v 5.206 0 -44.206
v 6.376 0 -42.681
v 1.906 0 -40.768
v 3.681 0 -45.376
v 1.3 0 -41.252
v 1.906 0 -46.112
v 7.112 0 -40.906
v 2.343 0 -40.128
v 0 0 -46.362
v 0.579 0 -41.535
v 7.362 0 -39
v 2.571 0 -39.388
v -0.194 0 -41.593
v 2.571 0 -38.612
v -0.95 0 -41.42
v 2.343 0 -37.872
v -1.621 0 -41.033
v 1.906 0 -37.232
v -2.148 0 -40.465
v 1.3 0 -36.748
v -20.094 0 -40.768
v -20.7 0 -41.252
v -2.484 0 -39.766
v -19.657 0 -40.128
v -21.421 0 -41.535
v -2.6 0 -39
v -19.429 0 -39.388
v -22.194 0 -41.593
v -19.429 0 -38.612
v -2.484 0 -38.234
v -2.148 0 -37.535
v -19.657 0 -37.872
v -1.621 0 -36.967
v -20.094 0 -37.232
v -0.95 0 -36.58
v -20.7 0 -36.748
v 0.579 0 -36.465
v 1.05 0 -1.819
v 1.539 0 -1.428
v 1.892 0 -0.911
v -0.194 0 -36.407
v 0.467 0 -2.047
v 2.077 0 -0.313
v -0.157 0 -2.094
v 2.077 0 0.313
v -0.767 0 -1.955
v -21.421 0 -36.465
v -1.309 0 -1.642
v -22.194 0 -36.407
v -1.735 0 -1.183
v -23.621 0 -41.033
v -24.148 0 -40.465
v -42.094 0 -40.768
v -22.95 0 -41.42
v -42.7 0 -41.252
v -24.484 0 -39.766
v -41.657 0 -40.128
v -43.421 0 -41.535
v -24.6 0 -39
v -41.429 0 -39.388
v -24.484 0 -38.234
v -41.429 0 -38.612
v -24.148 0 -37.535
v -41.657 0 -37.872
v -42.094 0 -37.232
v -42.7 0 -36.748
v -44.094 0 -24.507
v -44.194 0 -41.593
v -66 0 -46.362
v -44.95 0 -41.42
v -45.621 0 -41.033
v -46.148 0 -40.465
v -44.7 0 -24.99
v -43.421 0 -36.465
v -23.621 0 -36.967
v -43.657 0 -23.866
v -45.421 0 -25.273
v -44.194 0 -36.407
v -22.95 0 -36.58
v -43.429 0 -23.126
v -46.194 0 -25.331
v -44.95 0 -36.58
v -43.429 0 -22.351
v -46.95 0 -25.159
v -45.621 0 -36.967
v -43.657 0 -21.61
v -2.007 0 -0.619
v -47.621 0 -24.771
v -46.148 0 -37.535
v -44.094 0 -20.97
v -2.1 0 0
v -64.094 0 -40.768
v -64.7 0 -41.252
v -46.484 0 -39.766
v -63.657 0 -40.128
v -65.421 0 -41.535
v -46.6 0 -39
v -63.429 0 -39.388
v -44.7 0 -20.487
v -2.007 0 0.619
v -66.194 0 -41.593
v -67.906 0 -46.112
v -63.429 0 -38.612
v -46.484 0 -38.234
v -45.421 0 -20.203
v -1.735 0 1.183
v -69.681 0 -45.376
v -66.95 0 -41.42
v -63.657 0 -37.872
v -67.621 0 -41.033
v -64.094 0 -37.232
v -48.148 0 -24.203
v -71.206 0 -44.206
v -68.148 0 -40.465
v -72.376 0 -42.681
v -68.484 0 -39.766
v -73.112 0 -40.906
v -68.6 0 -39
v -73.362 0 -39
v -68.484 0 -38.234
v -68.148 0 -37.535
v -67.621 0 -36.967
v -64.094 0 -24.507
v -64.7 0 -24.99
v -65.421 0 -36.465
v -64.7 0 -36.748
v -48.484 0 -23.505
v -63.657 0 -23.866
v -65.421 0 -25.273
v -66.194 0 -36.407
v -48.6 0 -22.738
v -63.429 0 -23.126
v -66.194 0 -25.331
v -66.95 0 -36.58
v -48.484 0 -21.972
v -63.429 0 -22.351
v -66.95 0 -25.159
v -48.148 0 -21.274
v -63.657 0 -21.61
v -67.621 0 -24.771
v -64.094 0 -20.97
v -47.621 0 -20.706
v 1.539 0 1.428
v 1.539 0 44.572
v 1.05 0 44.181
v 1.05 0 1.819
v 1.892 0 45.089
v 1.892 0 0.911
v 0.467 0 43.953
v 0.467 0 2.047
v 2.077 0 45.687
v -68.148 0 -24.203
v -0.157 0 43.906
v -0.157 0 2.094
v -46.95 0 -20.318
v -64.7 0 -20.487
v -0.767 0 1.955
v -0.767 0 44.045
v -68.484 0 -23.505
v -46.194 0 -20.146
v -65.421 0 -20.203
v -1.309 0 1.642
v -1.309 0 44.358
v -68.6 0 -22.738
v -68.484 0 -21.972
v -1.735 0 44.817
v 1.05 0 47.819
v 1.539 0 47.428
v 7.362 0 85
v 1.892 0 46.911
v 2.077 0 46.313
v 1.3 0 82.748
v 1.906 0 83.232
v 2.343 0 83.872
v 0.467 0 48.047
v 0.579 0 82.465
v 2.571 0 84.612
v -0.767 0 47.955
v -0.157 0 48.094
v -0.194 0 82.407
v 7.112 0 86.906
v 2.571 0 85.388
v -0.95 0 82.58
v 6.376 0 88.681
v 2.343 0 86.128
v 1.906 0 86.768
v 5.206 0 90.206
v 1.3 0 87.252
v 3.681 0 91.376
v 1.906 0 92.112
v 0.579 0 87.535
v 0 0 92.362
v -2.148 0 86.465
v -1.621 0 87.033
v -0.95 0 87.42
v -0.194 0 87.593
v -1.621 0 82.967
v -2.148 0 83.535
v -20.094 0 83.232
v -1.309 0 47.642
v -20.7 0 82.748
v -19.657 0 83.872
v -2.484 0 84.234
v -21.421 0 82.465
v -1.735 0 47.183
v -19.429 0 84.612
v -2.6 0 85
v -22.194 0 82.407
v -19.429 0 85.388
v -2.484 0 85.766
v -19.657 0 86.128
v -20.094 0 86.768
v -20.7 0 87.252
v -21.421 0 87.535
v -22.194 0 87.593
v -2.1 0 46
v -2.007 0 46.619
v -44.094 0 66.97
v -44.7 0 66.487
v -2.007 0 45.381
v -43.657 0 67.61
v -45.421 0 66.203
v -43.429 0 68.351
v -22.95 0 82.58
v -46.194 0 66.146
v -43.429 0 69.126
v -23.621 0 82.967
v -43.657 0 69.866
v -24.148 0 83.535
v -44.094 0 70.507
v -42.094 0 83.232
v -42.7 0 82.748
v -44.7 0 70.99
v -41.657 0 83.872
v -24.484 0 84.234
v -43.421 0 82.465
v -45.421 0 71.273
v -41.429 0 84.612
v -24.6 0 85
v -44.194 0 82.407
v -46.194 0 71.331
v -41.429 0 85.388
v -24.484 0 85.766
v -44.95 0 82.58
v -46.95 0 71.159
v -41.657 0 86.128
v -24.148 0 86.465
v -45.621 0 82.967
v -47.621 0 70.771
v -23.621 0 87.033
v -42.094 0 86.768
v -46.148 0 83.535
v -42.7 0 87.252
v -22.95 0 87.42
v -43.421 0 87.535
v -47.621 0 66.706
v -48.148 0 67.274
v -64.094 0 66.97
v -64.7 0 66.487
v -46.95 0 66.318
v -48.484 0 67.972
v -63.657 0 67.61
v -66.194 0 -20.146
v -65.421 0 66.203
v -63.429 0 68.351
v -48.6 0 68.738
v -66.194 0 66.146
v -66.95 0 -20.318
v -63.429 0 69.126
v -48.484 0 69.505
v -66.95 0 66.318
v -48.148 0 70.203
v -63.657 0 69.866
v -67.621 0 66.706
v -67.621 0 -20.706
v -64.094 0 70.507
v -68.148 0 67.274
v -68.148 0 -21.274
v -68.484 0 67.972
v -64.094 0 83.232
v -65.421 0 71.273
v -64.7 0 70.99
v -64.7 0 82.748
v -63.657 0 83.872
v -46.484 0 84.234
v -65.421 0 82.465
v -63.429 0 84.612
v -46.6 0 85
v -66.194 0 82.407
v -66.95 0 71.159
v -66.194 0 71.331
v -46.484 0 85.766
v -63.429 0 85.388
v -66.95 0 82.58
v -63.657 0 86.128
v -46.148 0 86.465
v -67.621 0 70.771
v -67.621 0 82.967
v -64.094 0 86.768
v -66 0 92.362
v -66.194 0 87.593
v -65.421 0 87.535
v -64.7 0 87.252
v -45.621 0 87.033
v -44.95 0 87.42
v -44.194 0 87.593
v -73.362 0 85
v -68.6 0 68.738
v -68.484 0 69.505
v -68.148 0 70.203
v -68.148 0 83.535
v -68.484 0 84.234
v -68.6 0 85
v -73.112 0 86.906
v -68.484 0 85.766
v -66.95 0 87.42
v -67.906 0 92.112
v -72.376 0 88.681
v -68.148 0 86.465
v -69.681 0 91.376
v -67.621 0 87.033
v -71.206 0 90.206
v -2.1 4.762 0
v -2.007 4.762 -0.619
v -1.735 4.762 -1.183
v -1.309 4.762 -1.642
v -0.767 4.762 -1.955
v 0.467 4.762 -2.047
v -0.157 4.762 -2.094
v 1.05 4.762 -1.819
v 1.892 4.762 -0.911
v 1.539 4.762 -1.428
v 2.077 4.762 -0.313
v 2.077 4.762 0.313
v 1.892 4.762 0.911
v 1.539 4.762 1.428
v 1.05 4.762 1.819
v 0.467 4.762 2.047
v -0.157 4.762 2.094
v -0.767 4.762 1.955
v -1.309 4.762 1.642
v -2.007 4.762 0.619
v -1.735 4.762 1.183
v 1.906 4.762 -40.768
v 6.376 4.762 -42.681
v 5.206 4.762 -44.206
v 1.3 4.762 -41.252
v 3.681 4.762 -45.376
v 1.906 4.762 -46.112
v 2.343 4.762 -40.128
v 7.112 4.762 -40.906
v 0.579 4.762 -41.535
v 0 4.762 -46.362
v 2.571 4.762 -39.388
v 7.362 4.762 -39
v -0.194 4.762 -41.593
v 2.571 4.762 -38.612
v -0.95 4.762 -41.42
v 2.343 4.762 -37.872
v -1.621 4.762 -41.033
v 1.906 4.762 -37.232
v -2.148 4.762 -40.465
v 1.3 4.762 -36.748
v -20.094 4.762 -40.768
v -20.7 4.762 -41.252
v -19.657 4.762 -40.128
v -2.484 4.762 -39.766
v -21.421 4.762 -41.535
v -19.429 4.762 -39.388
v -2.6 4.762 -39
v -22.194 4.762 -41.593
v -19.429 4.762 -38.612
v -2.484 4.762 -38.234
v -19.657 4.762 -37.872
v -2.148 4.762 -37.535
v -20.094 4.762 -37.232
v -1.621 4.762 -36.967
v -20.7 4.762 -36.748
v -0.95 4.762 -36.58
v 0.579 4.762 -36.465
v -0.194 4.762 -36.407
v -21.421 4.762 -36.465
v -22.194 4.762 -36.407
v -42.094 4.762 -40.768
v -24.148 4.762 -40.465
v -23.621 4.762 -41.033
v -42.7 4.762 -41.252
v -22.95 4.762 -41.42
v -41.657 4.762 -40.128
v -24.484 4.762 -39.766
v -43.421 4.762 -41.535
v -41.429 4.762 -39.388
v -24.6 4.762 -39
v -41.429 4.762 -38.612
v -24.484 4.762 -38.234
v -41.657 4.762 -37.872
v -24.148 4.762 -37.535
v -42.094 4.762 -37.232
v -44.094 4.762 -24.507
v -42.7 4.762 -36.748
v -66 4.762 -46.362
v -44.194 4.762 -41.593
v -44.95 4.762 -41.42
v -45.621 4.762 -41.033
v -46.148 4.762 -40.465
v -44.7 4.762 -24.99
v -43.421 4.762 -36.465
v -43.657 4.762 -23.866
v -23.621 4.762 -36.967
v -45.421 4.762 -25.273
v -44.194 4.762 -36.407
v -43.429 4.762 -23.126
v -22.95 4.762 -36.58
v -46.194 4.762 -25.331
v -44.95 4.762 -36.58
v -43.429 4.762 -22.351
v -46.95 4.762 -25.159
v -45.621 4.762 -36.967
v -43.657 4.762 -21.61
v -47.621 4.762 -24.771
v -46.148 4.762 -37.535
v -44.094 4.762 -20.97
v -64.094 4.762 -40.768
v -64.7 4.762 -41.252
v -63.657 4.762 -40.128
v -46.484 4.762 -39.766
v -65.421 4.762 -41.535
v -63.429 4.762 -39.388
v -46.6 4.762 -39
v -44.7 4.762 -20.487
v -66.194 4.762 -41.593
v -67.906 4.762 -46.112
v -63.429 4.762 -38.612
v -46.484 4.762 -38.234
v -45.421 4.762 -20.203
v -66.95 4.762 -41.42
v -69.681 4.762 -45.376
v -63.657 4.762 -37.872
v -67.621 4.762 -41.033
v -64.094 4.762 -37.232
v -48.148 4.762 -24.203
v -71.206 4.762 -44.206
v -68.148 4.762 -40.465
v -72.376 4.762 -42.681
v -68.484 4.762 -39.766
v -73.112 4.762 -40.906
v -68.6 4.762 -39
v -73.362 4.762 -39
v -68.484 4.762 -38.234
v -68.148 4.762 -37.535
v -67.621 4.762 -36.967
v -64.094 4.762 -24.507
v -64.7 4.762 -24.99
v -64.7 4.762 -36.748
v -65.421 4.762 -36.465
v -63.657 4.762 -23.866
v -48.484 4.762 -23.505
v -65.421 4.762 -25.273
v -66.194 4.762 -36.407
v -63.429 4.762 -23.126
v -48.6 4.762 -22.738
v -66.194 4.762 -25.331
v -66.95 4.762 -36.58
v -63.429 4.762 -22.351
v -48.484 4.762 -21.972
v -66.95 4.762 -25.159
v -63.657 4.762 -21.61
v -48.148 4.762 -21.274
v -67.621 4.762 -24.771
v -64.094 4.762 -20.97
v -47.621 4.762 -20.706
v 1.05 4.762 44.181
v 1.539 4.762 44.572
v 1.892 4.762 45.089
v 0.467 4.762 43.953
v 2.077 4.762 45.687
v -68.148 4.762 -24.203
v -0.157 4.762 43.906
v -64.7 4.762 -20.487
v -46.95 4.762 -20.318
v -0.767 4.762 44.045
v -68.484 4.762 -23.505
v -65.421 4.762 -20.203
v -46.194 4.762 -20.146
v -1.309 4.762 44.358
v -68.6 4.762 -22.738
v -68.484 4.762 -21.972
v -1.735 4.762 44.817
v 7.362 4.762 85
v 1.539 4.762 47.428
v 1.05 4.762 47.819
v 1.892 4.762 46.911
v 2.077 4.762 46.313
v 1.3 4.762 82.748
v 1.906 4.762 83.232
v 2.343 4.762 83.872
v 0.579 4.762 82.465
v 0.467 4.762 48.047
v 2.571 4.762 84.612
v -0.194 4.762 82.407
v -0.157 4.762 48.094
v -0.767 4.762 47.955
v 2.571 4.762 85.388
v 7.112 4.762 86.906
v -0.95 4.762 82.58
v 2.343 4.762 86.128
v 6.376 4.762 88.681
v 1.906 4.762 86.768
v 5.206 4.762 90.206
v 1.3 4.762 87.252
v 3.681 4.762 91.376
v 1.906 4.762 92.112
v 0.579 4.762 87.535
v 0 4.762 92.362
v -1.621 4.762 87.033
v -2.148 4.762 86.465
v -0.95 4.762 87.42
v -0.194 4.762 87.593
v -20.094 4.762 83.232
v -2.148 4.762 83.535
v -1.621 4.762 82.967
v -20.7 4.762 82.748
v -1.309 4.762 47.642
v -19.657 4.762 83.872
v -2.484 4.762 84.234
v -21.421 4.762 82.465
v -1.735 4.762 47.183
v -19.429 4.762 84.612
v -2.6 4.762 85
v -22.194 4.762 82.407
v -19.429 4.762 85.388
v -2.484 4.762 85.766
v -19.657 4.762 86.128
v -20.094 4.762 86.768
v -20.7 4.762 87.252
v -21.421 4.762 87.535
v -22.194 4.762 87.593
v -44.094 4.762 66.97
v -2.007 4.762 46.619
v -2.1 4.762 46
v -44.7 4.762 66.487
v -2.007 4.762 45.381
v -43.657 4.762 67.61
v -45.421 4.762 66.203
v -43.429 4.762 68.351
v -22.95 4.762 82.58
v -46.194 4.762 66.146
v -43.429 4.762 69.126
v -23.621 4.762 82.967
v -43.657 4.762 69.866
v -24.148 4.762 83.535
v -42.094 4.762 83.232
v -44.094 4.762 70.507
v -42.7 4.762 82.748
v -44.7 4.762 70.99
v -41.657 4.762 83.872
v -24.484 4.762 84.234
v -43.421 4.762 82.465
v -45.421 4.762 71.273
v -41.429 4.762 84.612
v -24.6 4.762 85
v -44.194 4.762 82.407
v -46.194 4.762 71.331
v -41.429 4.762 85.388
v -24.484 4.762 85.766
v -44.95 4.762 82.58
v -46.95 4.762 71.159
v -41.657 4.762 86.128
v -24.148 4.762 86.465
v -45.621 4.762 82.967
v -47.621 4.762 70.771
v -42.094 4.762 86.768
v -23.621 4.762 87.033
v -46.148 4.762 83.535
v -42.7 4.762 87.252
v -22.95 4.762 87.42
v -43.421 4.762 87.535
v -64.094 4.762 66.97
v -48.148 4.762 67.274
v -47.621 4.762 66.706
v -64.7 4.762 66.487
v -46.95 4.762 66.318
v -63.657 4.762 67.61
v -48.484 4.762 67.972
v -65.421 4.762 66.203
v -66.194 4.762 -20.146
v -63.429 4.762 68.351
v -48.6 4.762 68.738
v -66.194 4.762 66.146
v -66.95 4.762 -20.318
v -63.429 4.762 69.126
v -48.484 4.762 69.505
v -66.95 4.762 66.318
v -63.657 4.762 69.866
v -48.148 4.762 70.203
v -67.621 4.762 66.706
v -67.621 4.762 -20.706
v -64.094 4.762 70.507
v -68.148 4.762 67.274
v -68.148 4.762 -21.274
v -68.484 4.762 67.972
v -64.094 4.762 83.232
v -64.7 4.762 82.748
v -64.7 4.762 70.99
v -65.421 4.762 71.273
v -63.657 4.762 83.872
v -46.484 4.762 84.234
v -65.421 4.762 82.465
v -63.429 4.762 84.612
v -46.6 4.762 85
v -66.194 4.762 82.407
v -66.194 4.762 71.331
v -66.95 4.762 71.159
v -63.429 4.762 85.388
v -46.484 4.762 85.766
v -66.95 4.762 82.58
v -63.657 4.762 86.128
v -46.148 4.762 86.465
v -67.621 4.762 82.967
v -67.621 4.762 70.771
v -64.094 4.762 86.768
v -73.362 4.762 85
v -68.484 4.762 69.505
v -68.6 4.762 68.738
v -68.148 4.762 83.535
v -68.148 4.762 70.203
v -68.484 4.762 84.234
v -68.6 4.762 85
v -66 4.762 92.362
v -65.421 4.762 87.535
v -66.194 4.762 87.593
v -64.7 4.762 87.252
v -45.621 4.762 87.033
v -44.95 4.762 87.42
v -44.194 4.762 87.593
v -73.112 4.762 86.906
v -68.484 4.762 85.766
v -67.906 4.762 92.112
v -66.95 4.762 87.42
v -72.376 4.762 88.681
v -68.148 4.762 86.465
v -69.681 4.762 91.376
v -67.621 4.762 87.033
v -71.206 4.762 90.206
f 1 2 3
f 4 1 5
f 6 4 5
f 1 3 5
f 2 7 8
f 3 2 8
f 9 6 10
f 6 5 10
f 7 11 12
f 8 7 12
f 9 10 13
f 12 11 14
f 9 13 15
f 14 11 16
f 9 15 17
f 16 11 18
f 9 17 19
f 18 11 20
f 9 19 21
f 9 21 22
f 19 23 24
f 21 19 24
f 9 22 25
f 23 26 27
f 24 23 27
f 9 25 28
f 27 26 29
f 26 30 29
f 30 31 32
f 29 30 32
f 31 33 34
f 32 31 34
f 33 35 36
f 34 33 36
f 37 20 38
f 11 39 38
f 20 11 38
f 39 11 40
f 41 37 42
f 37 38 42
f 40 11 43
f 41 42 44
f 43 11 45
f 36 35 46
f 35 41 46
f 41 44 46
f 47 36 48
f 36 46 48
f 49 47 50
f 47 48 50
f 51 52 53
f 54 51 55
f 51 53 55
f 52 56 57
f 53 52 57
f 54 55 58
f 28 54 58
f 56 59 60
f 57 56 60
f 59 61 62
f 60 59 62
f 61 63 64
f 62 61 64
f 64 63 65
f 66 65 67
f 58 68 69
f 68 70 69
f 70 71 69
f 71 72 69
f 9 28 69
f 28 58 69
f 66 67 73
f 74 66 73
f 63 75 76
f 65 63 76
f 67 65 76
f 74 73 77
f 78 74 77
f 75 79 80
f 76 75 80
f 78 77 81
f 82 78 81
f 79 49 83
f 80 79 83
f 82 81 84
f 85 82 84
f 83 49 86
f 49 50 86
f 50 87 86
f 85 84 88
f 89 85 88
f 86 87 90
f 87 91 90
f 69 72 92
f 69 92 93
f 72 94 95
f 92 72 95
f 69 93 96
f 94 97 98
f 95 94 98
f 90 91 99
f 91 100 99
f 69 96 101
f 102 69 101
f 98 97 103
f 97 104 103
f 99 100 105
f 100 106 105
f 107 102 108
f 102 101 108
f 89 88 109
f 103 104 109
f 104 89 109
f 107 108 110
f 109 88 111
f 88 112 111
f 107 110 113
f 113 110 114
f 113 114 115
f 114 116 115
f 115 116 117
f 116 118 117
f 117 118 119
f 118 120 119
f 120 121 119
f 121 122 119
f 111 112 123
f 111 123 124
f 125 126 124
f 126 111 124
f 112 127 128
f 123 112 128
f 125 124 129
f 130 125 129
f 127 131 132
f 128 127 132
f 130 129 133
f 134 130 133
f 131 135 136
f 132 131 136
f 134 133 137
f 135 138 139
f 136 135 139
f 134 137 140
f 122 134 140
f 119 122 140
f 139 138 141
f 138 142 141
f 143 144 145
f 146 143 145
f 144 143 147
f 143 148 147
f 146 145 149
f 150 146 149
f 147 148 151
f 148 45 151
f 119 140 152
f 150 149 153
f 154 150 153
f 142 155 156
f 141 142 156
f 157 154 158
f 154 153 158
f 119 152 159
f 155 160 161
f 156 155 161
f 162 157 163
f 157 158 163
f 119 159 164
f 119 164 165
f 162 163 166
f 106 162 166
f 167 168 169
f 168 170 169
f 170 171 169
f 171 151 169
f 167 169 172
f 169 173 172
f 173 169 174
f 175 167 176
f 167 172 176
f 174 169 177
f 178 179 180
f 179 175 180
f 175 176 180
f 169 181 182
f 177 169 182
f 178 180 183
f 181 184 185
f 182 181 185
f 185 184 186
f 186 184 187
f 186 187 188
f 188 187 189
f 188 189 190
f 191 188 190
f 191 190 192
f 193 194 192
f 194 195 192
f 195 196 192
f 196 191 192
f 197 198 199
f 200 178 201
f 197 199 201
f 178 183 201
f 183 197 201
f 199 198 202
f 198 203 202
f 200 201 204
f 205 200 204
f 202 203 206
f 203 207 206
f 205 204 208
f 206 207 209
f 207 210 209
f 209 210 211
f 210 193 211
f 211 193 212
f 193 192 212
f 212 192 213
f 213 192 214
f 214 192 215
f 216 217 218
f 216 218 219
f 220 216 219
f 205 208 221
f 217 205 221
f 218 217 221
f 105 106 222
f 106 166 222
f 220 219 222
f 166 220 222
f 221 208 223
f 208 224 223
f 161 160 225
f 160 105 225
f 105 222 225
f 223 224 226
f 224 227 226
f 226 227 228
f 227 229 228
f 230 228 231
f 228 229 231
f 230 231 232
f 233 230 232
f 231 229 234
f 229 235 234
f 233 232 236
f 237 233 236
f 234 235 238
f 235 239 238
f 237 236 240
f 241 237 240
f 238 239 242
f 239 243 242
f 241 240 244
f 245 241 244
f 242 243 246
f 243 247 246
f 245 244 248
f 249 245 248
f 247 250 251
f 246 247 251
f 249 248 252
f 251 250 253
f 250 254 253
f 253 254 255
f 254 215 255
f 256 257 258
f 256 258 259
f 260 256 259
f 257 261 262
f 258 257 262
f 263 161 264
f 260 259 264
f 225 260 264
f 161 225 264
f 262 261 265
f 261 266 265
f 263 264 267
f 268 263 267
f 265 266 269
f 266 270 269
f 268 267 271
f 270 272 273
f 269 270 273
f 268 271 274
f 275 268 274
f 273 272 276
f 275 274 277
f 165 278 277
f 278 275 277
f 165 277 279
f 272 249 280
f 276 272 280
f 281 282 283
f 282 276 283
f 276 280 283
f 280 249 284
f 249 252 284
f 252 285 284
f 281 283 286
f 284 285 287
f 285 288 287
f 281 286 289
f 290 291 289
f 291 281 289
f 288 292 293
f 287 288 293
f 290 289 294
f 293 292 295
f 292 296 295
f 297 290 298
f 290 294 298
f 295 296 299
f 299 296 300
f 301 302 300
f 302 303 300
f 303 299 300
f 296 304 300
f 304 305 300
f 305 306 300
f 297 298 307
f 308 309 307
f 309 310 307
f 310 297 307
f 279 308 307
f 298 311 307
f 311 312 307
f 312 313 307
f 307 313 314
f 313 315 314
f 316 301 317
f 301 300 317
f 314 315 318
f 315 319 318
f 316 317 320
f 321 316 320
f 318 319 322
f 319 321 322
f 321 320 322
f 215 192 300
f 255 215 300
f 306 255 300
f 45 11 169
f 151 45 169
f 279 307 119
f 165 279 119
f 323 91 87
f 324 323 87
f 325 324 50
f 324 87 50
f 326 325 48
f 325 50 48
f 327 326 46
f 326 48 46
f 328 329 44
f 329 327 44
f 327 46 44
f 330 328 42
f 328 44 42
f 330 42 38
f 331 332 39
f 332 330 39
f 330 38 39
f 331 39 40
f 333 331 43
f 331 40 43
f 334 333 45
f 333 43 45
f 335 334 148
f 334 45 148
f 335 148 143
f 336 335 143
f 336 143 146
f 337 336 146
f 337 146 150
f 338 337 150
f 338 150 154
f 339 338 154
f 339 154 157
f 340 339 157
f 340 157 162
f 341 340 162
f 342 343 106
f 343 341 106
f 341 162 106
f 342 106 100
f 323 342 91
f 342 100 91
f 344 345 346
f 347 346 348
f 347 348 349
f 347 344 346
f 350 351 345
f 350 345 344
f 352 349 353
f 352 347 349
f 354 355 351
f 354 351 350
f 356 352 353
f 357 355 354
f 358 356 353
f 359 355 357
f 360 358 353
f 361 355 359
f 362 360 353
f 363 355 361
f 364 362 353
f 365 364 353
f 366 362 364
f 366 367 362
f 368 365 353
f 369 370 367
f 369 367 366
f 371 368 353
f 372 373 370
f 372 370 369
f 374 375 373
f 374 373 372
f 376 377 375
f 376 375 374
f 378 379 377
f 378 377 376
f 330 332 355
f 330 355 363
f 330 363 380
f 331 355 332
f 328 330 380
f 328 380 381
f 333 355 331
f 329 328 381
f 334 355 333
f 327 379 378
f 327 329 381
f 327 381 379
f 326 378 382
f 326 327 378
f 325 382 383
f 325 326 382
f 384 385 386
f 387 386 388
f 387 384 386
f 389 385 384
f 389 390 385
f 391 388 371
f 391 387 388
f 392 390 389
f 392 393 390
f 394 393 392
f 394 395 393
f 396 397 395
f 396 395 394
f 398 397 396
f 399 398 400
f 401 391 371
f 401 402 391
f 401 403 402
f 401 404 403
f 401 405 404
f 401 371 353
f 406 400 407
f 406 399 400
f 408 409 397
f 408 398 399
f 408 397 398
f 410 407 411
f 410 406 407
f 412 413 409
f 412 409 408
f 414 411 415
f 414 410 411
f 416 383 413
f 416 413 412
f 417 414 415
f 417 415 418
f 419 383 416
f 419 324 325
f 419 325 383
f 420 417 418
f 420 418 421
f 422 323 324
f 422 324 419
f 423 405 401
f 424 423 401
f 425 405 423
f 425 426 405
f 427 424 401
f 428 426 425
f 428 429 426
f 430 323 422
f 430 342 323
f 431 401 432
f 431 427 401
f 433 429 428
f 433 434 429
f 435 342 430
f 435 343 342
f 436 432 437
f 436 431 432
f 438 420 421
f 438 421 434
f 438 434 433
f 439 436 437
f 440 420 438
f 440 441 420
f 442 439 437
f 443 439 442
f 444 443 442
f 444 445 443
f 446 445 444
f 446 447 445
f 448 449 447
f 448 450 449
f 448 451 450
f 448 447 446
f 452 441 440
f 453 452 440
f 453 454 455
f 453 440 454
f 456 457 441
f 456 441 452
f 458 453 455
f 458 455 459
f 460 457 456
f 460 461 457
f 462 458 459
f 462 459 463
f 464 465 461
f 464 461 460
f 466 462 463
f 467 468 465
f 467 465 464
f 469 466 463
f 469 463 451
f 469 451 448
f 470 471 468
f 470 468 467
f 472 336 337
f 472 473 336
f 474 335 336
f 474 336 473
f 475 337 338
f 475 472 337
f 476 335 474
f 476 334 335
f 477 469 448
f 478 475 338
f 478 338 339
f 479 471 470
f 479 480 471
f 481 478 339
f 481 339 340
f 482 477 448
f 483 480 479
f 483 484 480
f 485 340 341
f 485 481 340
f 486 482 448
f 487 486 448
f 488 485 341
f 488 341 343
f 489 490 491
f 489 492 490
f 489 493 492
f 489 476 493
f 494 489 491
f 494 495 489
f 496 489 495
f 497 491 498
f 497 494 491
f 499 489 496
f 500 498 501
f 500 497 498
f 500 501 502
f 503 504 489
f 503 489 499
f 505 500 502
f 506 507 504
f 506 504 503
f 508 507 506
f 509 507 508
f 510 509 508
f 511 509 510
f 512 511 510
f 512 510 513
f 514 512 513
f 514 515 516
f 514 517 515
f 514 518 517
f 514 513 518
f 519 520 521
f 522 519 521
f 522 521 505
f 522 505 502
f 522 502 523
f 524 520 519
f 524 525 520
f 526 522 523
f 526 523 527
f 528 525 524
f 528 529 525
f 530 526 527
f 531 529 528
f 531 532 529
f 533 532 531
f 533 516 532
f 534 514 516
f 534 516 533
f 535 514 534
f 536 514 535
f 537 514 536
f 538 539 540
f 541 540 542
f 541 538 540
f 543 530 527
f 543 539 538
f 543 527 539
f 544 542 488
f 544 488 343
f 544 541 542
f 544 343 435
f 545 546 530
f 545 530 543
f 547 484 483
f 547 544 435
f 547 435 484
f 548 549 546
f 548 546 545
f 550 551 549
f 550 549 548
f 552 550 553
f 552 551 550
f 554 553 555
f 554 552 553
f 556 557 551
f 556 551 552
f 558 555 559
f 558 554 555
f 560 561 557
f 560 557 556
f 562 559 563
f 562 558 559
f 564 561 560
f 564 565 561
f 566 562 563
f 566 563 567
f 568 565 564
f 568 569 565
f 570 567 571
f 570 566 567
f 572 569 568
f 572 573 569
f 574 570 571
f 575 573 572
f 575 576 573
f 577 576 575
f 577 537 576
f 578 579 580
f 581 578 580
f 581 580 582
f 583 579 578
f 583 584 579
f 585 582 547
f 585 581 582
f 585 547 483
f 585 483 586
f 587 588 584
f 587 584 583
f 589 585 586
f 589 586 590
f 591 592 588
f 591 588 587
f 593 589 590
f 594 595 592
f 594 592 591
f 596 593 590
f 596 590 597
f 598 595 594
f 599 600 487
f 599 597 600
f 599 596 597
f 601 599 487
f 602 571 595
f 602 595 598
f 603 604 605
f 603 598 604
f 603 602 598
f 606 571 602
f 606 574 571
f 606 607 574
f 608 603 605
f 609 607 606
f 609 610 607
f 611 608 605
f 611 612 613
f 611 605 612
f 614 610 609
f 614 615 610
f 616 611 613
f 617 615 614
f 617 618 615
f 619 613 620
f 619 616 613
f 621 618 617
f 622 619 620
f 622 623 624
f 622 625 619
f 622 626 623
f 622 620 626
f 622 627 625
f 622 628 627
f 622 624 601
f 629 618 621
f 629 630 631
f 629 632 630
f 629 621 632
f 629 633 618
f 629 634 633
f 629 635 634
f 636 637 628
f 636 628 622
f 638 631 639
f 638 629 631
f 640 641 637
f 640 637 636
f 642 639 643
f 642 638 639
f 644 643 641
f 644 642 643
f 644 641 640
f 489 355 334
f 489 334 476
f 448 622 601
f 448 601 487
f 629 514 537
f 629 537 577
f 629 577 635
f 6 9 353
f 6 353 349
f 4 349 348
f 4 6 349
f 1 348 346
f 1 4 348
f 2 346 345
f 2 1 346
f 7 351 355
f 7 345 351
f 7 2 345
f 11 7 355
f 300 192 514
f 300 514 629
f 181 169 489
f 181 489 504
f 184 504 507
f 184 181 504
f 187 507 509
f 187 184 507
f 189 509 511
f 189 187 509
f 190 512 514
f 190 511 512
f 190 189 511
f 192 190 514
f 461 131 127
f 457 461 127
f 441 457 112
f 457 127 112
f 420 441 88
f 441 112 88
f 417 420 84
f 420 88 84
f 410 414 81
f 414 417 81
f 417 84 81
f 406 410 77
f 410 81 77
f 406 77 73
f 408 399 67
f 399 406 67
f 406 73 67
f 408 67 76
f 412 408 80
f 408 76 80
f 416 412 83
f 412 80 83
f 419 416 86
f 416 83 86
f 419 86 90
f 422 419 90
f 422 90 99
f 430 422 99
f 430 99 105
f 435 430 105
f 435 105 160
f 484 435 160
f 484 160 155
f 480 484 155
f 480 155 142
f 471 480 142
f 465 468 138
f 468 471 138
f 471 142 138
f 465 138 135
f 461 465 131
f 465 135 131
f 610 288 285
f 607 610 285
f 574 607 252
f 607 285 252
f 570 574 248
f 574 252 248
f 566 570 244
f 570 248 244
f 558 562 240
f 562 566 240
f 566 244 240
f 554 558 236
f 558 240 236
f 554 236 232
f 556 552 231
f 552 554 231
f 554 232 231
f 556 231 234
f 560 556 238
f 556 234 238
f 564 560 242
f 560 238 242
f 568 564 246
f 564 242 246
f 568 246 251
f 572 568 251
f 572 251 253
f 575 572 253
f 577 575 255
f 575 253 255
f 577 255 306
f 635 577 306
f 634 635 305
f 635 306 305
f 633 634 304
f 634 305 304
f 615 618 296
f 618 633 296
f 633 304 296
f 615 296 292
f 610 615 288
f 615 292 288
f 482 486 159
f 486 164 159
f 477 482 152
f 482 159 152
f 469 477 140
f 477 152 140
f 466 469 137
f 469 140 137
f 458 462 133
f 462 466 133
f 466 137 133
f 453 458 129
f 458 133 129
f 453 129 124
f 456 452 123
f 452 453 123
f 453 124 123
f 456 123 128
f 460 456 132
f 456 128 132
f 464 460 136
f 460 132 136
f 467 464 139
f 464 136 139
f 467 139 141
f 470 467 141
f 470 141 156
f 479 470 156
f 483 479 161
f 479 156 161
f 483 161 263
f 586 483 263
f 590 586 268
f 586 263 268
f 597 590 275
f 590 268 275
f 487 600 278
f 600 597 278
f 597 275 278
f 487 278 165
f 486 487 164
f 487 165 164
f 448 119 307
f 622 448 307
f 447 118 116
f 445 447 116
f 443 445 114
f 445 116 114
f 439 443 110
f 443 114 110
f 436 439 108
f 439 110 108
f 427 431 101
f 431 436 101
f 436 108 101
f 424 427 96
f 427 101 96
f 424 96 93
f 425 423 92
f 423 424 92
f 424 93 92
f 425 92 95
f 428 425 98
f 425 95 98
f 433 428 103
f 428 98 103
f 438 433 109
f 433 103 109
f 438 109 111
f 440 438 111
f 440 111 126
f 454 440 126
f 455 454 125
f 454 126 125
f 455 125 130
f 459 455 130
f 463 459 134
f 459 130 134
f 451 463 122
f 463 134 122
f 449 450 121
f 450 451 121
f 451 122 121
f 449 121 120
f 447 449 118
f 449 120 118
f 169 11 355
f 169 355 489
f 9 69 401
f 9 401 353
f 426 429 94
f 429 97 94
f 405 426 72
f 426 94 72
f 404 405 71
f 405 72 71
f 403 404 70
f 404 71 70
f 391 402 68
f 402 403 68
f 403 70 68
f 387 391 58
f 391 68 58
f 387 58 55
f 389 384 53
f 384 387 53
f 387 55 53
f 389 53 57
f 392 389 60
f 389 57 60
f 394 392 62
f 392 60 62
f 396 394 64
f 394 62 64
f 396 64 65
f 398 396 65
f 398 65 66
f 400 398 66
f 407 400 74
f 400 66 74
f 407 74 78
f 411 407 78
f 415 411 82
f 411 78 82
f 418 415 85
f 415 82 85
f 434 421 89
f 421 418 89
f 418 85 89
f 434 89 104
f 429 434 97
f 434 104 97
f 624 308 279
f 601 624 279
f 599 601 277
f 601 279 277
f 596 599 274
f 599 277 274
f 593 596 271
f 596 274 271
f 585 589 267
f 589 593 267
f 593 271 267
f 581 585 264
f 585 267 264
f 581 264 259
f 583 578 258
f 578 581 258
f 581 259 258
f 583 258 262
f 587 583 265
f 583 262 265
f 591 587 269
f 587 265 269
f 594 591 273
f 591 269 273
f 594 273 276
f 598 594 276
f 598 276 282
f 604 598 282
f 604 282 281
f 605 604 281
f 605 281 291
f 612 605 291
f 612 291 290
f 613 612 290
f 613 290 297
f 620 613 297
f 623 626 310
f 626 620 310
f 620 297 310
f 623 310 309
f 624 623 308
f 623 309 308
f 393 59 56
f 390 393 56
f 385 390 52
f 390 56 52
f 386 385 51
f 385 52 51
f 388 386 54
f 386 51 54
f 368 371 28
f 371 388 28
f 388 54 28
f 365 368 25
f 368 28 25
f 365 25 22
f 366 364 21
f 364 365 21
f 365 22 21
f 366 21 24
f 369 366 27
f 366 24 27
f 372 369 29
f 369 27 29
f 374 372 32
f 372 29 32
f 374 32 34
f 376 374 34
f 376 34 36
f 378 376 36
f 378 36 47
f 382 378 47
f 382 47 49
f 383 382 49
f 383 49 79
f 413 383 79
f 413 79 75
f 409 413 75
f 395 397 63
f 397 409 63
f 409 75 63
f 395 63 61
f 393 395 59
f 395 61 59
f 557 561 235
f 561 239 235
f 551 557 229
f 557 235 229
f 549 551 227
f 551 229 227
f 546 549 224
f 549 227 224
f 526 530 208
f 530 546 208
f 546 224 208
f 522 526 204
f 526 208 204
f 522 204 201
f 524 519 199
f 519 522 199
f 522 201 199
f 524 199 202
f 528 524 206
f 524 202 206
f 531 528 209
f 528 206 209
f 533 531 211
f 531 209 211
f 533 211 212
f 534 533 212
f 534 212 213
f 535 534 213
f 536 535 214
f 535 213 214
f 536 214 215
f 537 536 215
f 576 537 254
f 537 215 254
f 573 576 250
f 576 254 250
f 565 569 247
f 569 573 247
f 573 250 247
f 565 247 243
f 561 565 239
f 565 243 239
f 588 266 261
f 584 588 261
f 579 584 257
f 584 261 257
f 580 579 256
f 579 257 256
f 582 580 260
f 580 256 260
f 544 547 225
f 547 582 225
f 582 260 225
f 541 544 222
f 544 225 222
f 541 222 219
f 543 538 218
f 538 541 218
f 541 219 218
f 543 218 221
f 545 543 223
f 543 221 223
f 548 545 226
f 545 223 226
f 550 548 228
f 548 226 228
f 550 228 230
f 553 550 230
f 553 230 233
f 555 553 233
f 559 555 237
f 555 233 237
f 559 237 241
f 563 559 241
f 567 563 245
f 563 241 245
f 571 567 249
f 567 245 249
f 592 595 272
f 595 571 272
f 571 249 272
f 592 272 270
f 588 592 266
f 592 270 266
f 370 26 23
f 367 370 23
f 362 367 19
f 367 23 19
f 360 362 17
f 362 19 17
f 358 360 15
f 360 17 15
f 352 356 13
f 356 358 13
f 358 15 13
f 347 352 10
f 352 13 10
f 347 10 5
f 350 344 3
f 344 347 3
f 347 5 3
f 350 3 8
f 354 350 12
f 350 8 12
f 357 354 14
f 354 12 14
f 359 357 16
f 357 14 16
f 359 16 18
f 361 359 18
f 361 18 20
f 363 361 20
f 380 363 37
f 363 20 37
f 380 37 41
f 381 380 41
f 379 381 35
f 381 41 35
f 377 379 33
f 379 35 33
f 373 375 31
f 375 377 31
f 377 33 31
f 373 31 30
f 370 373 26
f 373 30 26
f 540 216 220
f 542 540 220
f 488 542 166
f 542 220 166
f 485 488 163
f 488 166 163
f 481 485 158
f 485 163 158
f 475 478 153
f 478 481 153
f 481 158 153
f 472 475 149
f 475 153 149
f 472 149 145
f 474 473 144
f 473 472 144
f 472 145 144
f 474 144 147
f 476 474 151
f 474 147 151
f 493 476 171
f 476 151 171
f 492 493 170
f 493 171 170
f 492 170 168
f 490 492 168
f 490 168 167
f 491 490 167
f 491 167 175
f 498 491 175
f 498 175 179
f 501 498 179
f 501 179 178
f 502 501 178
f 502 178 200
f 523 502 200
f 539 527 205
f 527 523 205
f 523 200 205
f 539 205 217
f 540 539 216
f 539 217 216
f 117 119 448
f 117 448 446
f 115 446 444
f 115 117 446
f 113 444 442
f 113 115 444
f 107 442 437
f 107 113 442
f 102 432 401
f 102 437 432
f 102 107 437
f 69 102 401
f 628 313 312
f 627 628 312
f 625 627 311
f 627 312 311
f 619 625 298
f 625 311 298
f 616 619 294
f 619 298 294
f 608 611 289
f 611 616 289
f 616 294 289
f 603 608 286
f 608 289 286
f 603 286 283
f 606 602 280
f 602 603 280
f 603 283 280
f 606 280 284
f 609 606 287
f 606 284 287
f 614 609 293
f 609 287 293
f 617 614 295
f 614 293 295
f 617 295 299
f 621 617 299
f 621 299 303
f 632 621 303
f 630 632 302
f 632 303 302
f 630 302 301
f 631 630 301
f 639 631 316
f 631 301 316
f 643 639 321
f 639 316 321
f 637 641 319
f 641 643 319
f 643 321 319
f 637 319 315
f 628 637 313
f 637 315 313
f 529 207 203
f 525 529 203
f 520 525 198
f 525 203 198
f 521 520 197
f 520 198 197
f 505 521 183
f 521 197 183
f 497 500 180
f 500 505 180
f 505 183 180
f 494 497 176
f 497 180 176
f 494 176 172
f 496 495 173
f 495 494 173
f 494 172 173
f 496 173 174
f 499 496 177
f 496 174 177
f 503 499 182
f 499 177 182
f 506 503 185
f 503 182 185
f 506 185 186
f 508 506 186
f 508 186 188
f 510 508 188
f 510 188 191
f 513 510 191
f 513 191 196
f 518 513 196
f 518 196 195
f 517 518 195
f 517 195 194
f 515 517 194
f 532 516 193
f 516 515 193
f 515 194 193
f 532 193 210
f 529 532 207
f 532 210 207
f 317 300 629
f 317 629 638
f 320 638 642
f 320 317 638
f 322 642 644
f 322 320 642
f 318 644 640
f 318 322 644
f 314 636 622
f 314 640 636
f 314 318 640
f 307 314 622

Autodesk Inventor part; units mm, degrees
ref_plane "YZ Plane" through (0, 0, 0) normal (1, 0, 0) x (0, 1, 0)
ref_plane "XZ Plane" through (0, 0, 0) normal (0, 1, 0) x (-1, 0, 0)
ref_plane "XY Plane" through (0, 0, 0) normal (0, 0, 1) x (1, 0, 0)
sketch "Sketch1" plane through (0, 0, 0) normal (0, 1, 0) x (-1, 0, 0)
  circle A0 centre (0, 0) radius 2.1
  circle A1 centre (0, 46) radius 2.1
  circle A2 centre (0, -39) radius 2.6
  circle A3 centre (66, -39) radius 2.6
  circle A4 centre (46, -22.7383) radius 2.6
  circle A5 centre (66, -22.7383) radius 2.6
  circle A6 centre (44, -39) radius 2.6
  circle A7 centre (22, -39) radius 2.6
  line L0 (0, 23) -> (66, 23) construction
  circle A8 centre (0, 85) radius 2.6
  circle A9 centre (66, 85) radius 2.6
  circle A10 centre (46, 68.7383) radius 2.6
  circle A11 centre (66, 68.7383) radius 2.6
  circle A12 centre (44, 85) radius 2.6
  circle A13 centre (22, 85) radius 2.6
  circle A14 centre (66, -39) radius 7.3625 construction
  circle A15 centre (66, 85) radius 7.3625 construction
  circle A16 centre (0, 85) radius 7.3625 construction
  circle A17 centre (0, -39) radius 7.3625 construction
  line L1 (73.3625, -39) -> (73.3625, 85)
  line L2 (66, -46.3625) -> (0, -46.3625)
  line L3 (-7.3625, -39) -> (-7.3625, 85)
  line L4 (0, 92.3625) -> (66, 92.3625)
  arc A18 (66, -46.3625) -> (73.3625, -39) centre (66, -39) ccw
  arc A19 (-7.3625, -39) -> (0, -46.3625) centre (0, -39) ccw
  arc A20 (0, 92.3625) -> (-7.3625, 85) centre (0, 85) ccw
  arc A21 (73.3625, 85) -> (66, 92.3625) centre (66, 85) ccw
  dimension "d0" = 4.2
  dimension "d1" = 46
  dimension "d2" = 39
  dimension "d3" = 66
  dimension "d4" = 20
  dimension "d6" = 22
  dimension "d7" = 22
  dimension "d8" = 23
  dimension "d9" = 4.7625
  dimension "d12" = 91.4766
  dimension "d13" = 5.2
extrude "Extrusion1" add sketch "Sketch1" along normal blind 4.7625
equation "\"d6\" = 0.333333 * d3"
equation "\"d7\" = d6"
equation "\"d8\" = 0.5 * d1"
properties part number "CNC-016-SpindleMountPlate" material "Aluminum 6061"
